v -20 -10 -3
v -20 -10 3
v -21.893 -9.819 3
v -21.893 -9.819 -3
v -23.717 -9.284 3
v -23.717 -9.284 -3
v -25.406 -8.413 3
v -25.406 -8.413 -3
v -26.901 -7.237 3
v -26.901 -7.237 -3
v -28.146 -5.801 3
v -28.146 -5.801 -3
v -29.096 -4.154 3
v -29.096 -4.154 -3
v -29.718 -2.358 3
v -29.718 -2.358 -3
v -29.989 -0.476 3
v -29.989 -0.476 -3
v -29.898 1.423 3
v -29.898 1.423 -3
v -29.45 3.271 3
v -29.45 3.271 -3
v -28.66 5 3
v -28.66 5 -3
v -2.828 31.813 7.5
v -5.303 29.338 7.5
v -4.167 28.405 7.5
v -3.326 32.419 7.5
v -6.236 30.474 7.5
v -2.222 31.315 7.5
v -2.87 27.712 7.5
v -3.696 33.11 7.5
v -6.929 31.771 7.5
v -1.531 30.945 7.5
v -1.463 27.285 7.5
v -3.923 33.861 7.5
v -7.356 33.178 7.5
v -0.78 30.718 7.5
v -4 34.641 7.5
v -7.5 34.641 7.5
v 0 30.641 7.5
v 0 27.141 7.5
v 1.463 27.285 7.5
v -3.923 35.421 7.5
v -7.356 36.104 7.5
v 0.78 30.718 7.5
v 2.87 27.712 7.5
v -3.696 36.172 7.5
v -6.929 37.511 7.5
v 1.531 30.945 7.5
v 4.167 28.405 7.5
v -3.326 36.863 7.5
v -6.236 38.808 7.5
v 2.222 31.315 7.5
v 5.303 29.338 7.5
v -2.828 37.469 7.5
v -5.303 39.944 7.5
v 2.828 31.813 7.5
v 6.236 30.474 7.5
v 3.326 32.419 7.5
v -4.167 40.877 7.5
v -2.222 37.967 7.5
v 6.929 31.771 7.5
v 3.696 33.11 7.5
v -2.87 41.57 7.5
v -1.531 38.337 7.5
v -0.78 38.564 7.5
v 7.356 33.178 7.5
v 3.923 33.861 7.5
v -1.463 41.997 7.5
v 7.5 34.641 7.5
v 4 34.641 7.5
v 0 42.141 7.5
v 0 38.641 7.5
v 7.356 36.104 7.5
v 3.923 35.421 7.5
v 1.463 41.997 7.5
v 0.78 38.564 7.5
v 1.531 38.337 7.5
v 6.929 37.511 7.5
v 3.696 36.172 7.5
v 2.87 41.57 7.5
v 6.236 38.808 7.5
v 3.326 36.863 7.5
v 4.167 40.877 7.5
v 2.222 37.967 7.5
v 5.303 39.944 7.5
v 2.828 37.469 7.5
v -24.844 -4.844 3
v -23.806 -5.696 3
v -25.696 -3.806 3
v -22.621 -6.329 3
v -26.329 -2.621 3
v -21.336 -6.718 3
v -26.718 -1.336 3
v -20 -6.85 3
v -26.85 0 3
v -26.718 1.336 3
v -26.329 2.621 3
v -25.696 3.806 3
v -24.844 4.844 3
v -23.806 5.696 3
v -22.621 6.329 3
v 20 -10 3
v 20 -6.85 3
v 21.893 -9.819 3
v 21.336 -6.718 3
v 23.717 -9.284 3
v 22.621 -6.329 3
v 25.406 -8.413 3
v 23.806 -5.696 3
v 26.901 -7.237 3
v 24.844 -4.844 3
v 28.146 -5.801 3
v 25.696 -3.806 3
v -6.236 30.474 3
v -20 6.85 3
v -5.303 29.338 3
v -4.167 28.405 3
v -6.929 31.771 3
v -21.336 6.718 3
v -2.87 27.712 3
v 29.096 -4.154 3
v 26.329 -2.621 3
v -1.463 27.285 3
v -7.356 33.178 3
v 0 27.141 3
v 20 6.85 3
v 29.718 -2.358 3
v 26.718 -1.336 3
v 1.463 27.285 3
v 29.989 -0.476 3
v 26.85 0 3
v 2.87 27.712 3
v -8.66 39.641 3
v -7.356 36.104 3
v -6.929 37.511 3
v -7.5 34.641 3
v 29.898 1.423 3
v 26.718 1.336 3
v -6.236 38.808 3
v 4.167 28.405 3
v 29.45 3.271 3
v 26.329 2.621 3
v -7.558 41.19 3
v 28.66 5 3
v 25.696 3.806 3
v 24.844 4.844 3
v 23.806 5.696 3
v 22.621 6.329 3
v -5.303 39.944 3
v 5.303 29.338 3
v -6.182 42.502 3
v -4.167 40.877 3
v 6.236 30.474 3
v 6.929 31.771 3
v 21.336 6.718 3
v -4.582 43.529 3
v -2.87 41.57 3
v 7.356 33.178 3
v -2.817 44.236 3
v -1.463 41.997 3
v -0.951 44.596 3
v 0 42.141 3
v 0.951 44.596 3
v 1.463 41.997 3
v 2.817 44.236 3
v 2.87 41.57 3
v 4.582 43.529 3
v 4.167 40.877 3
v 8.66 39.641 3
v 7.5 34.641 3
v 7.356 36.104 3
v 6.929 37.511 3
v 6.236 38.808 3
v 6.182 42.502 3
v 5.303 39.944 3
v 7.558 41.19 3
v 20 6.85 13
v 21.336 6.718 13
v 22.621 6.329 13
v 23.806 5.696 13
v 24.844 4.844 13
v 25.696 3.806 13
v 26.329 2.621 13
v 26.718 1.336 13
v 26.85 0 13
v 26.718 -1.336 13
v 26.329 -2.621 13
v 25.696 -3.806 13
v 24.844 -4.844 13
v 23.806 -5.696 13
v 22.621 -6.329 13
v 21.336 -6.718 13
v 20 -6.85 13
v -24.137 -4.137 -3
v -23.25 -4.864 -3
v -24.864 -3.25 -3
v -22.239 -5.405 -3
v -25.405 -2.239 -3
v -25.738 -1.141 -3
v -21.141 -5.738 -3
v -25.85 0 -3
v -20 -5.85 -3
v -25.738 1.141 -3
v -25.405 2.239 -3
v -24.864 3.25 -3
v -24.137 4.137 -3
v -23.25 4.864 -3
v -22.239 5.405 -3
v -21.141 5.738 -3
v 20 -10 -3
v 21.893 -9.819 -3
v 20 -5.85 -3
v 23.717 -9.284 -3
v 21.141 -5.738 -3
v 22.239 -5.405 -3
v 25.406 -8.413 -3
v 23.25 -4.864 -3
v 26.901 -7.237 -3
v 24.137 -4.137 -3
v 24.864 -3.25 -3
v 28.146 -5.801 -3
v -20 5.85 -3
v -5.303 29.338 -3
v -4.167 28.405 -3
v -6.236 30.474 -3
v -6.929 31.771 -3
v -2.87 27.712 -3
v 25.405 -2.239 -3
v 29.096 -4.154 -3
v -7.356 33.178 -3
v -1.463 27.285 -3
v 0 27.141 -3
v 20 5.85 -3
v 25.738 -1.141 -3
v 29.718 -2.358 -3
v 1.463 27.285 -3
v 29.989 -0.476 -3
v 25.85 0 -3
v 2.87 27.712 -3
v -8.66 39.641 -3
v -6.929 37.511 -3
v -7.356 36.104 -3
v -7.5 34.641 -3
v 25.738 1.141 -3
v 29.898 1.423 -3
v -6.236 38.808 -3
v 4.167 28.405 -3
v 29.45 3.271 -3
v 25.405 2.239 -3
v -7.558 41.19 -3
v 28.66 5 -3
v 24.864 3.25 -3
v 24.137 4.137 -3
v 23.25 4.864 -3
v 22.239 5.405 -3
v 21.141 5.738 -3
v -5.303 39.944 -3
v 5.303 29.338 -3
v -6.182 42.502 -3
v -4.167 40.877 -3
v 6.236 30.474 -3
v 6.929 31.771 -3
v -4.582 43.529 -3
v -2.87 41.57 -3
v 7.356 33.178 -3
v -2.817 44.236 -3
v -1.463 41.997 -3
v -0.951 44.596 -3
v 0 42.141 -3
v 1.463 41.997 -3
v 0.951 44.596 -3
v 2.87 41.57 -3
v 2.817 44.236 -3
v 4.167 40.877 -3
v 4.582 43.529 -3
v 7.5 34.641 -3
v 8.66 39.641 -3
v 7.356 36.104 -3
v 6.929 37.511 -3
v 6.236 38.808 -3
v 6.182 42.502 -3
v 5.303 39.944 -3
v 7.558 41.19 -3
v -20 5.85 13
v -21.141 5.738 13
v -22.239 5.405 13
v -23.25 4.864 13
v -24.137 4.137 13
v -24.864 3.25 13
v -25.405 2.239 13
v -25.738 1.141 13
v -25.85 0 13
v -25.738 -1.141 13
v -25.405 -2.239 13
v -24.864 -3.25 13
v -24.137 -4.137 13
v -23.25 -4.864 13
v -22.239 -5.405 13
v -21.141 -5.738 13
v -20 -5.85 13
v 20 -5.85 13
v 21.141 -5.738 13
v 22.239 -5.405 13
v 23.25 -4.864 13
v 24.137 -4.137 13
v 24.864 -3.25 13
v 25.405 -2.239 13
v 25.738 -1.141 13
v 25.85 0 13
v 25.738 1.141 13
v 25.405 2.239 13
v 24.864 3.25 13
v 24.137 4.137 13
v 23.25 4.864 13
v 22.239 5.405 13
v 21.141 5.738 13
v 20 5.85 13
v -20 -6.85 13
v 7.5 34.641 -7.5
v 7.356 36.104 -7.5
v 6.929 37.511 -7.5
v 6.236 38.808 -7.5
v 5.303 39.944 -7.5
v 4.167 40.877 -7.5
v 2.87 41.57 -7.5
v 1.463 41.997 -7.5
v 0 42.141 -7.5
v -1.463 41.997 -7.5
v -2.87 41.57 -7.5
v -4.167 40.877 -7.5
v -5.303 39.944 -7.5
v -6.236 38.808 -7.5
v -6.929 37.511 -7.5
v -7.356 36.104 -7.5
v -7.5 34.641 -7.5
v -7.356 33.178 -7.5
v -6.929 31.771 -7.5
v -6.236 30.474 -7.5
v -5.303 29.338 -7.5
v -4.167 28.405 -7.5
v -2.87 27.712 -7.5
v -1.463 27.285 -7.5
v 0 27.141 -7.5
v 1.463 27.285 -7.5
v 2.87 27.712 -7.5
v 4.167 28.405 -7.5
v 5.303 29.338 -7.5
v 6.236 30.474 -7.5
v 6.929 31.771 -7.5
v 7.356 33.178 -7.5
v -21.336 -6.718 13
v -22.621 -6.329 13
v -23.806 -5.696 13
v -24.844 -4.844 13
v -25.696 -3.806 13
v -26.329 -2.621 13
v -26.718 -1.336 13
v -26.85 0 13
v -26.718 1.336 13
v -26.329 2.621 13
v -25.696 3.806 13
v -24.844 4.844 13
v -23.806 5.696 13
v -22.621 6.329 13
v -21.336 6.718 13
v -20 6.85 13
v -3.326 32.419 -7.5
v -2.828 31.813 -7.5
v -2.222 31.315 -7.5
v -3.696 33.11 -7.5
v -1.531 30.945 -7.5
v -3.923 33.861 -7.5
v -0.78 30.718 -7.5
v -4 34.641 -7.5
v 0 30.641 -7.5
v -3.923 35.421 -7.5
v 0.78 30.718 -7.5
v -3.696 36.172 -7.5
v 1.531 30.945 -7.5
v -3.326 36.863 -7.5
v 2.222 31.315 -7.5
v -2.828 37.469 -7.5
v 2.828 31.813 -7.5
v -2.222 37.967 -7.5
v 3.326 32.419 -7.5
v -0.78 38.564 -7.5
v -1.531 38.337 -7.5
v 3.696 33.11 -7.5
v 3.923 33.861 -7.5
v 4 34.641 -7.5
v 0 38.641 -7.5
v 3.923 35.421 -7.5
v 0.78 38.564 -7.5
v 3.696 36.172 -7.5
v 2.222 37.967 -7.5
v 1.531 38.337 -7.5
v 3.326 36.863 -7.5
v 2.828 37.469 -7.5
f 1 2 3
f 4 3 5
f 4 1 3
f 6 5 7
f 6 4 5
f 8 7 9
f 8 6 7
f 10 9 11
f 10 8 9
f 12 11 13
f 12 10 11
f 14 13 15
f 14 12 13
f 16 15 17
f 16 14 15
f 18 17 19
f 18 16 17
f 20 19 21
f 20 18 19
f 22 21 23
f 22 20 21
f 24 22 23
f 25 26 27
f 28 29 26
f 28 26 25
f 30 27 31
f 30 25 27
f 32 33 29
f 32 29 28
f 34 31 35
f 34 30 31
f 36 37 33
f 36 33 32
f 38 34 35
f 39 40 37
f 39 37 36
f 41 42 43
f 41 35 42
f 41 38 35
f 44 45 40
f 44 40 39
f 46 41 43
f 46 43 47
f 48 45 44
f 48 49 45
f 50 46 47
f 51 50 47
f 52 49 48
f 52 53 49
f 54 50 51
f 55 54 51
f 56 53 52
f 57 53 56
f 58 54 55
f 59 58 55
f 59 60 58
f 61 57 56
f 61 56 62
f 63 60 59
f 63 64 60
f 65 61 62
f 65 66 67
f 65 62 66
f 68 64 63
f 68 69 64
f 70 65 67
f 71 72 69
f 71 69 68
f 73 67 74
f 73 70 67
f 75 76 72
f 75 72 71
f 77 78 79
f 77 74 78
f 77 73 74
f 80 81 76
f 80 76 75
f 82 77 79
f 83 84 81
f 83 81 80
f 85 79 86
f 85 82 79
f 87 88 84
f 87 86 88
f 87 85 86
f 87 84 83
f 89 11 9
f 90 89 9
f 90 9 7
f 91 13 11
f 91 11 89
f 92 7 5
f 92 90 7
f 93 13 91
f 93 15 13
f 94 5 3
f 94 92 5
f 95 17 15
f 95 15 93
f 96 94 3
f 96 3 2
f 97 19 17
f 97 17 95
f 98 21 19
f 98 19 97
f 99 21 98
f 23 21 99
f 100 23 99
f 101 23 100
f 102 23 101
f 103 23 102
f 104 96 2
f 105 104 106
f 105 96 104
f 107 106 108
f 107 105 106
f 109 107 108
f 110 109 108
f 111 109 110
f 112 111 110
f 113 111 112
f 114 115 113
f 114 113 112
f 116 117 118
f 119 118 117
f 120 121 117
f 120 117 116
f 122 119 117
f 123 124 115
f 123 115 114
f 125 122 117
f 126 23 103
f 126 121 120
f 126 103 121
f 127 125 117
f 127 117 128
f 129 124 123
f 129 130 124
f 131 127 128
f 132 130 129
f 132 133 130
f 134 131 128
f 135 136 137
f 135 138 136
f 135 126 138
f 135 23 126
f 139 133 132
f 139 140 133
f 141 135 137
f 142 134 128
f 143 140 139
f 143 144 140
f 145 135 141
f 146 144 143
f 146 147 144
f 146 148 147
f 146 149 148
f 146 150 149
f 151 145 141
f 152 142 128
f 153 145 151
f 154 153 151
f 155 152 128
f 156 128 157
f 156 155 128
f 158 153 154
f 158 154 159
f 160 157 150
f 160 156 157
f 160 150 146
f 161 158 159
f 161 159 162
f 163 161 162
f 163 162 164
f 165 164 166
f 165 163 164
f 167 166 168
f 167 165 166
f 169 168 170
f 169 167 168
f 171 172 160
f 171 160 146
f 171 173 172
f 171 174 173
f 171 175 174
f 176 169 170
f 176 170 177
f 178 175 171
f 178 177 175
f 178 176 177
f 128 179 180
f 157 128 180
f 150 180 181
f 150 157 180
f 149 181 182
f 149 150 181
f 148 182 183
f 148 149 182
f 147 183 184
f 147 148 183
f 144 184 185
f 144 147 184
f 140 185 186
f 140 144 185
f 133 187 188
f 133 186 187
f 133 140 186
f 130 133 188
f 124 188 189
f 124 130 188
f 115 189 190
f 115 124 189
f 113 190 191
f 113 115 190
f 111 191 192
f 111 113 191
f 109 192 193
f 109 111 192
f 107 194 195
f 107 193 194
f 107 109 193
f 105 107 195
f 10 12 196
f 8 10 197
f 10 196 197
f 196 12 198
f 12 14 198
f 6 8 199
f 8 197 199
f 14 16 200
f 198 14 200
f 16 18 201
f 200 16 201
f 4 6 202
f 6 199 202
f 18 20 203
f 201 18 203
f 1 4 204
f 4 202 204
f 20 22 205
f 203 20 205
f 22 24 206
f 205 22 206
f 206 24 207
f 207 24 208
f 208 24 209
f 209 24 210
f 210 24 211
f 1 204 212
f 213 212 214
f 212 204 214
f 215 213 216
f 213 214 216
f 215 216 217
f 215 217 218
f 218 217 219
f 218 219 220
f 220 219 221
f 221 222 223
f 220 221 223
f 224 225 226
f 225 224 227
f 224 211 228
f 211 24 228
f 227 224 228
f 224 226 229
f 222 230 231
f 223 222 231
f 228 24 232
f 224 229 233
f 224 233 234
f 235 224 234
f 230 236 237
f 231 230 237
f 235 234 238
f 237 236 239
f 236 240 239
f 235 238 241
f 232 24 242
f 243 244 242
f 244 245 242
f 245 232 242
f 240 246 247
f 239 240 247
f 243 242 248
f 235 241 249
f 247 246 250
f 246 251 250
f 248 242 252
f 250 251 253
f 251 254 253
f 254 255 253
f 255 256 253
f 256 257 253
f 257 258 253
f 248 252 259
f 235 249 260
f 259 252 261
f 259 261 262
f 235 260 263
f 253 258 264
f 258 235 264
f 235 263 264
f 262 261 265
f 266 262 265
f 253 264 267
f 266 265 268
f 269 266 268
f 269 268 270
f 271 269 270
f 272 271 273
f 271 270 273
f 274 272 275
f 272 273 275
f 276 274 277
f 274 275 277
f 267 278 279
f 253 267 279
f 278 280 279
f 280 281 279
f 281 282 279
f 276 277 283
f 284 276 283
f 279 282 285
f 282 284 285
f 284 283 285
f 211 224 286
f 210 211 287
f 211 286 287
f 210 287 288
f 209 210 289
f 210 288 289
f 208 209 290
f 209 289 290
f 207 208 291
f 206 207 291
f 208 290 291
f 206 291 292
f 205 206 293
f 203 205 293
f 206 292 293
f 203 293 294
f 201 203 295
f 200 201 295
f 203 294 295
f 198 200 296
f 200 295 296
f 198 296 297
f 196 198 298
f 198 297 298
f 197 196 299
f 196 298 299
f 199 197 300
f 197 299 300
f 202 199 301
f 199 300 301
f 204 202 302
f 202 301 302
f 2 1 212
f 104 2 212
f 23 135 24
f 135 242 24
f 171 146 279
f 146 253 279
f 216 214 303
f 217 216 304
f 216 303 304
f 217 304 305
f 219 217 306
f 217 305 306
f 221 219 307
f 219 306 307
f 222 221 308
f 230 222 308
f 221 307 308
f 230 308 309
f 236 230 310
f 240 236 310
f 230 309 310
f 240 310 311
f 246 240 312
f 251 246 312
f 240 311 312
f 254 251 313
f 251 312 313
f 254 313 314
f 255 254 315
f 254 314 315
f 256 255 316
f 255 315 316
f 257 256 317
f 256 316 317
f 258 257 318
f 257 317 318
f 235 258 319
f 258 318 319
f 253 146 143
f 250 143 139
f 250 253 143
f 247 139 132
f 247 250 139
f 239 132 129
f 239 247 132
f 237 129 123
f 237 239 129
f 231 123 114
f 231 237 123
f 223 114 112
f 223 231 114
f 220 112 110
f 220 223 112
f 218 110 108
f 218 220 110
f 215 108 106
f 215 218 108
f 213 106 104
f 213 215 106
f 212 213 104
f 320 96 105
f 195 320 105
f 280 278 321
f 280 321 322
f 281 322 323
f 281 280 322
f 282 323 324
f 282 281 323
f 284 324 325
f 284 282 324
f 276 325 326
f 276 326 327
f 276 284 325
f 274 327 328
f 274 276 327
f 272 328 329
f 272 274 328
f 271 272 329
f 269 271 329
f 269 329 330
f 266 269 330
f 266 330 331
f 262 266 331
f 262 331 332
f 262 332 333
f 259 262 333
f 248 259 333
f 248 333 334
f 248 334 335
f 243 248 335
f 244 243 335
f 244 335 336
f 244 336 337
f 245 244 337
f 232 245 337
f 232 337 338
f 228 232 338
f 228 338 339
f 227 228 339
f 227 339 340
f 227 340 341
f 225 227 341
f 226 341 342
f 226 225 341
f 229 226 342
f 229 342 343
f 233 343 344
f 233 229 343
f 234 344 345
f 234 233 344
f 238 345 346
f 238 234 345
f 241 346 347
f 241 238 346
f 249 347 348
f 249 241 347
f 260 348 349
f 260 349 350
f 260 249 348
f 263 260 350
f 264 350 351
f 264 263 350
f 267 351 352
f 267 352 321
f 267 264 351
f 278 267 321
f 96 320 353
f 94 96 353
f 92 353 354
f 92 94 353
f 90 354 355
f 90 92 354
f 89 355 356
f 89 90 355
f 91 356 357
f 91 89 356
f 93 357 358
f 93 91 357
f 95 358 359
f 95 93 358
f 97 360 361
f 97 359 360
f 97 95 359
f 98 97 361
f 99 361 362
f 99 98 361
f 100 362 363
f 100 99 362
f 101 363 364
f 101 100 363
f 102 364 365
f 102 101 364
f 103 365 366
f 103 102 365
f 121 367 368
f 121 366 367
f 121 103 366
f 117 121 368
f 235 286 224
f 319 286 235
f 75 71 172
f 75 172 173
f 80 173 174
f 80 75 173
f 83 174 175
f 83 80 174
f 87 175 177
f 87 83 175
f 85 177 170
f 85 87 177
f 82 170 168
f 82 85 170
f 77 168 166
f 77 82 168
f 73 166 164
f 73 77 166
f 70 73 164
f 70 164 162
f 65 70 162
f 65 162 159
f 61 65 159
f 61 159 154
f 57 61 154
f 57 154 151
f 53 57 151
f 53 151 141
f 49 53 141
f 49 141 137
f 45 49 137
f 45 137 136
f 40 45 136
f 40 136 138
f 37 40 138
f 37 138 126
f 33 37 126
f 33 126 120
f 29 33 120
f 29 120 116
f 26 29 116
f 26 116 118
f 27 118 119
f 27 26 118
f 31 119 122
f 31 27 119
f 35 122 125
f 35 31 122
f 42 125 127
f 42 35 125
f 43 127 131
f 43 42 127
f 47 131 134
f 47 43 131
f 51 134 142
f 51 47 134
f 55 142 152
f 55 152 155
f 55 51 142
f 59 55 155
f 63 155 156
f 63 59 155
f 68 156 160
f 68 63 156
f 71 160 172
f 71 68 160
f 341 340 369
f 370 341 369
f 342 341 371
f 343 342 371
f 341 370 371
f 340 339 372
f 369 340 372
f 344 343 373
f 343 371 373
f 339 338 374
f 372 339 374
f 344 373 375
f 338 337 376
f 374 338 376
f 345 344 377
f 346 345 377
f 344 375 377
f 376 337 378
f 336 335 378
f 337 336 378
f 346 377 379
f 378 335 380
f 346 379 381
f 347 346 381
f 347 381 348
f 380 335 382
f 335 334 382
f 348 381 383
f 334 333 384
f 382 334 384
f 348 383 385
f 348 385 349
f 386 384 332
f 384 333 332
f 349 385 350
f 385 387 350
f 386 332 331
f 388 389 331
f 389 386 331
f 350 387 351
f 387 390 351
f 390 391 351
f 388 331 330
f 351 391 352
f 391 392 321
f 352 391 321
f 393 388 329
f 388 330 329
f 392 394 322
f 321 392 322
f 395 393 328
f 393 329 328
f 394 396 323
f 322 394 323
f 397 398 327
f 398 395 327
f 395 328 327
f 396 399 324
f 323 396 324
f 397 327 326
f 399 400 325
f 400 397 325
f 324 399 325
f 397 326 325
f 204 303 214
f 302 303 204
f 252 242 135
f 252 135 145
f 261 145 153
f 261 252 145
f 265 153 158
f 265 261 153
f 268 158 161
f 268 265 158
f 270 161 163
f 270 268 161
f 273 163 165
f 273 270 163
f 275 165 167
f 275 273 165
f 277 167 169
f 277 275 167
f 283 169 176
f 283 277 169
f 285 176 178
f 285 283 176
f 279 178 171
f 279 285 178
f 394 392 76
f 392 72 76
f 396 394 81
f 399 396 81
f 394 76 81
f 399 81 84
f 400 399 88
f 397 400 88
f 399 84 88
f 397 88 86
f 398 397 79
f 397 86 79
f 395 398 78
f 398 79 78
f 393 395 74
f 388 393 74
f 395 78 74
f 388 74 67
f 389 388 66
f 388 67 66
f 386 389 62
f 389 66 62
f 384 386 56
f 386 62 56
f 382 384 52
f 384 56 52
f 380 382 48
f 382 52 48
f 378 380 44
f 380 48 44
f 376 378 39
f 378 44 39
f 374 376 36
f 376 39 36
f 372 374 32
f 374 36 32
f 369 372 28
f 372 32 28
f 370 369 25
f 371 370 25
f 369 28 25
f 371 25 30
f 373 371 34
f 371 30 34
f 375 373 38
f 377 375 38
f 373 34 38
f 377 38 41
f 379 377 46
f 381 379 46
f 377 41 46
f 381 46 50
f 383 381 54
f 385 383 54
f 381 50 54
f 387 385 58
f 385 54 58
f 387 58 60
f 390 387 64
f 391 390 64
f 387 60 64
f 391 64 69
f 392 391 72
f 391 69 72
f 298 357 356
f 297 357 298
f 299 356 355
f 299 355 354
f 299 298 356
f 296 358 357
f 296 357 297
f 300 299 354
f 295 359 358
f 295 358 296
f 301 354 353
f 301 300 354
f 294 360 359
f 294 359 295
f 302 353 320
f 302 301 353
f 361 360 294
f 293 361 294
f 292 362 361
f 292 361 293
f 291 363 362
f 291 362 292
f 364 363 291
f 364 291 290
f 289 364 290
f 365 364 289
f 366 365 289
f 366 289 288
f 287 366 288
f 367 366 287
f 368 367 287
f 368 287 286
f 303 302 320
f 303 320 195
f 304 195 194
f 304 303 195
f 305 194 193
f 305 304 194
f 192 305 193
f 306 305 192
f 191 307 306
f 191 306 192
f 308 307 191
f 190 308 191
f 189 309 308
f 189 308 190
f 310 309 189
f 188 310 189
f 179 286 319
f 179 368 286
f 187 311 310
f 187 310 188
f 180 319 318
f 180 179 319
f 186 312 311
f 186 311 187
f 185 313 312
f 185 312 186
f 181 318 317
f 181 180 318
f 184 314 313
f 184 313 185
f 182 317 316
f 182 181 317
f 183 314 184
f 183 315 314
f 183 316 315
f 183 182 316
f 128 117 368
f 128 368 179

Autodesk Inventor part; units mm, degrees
ref_plane "YZ Plane" through (0, 0, 0) normal (1, 0, 0) x (0, 1, 0)
ref_plane "XZ Plane" through (0, 0, 0) normal (0, 1, 0) x (-1, 0, 0)
ref_plane "XY Plane" through (0, 0, 0) normal (0, 0, 1) x (1, 0, 0)
sketch "Sketch1" plane through (0, 0, 0) normal (0, 0, 1) x (1, 0, 0)
  arc A0 (8.6603, 39.641) -> (-8.6603, 39.641) centre (0, 34.641) ccw
  arc A1 (-28.6603, 5) -> (-20, -10) centre (-20, 0) ccw
  arc A2 (20, -10) -> (28.6603, 5) centre (20, 0) ccw
  line L0 (-8.6603, 39.641) -> (-28.6603, 5)
  line L1 (-20, -10) -> (20, -10)
  line L2 (28.6603, 5) -> (8.6603, 39.641)
  circle A3 centre (0, 34.641) radius 7.5
  line L3 (0, 56.0692) -> (0, -23.9282) projected
  line L4 (-46.1865, 0) -> (46.1865, 0) projected
  circle A4 centre (0, 34.641) radius 4
  point P0 (0, 0)
  dimension "d0" = 10
  dimension "d1" = 40
  dimension "d2" = 15
  dimension "d7" = 8
extrude "Extrusion1" add sketch "Sketch1" along normal mid plane 6
extrude "Extrusion2" add sketch "Sketch1" along normal mid plane 15 contours L3 A4 A3 | A3 L3 A4 | A4 L3 | L3 A4
extrude "Extrusion3" cut sketch "Sketch1" along normal through all both and the other way through all contours A4 L3 | L3 A4
sketch "Sketch2" plane through (0, 0, 3) normal (0, 0, 1) x (1, 0, 0)
  circle A0 centre (0, 34.641) radius 7.5 projected
  line L0 (-8.6603, 39.641) -> (-28.6603, 5) projected
  arc A1 (-28.6603, 5) -> (-20, -10) centre (-20, 0) ccw projected
  line L1 (-20, -10) -> (20, -10) projected
  arc A2 (20, -10) -> (28.6603, 5) centre (20, 0) ccw projected
  line L2 (28.6603, 5) -> (8.6603, 39.641) projected
  arc A3 (-20, 6.85) -> (-20, -6.85) centre (-20, 0) ccw
  line L3 (-20, -6.85) -> (20, -6.85)
  arc A4 (20, -6.85) -> (20, 6.85) centre (20, 0) ccw
  line L4 (-20, 6.85) -> (20, 6.85)
  arc A5 (8.6603, 39.641) -> (-8.6603, 39.641) centre (0, 34.641) ccw projected
  point P0 (0, 0)
  dimension "d10" = 3.15
extrude "Extrusion4" add sketch "Sketch2" along normal blind 10 contours L4 A4 L3 A3
sketch "Sketch3" plane through (0, 0, 13) normal (0, 0, 1) x (1, 0, 0)
  line L0 (-20, -6.85) -> (20, -6.85) projected
  arc A0 (20, -6.85) -> (20, 6.85) centre (20, 0) ccw projected
  line L1 (20, 6.85) -> (-20, 6.85) projected
  arc A1 (-20, 6.85) -> (-20, -6.85) centre (-20, 0) ccw projected
  line L2 (20, -5.85) -> (-20, -5.85)
  arc A2 (-20, 5.85) -> (-20, -5.85) centre (-20, 0) ccw
  line L3 (-20, 5.85) -> (20, 5.85)
  arc A3 (20, -5.85) -> (20, 5.85) centre (20, 0) ccw
  point P0 (0, 0)
  dimension "d13" = 1
extrude "Extrusion5" cut sketch "Sketch3" against normal through all contours L2 A2 L3 A3
properties part number "Offset"
